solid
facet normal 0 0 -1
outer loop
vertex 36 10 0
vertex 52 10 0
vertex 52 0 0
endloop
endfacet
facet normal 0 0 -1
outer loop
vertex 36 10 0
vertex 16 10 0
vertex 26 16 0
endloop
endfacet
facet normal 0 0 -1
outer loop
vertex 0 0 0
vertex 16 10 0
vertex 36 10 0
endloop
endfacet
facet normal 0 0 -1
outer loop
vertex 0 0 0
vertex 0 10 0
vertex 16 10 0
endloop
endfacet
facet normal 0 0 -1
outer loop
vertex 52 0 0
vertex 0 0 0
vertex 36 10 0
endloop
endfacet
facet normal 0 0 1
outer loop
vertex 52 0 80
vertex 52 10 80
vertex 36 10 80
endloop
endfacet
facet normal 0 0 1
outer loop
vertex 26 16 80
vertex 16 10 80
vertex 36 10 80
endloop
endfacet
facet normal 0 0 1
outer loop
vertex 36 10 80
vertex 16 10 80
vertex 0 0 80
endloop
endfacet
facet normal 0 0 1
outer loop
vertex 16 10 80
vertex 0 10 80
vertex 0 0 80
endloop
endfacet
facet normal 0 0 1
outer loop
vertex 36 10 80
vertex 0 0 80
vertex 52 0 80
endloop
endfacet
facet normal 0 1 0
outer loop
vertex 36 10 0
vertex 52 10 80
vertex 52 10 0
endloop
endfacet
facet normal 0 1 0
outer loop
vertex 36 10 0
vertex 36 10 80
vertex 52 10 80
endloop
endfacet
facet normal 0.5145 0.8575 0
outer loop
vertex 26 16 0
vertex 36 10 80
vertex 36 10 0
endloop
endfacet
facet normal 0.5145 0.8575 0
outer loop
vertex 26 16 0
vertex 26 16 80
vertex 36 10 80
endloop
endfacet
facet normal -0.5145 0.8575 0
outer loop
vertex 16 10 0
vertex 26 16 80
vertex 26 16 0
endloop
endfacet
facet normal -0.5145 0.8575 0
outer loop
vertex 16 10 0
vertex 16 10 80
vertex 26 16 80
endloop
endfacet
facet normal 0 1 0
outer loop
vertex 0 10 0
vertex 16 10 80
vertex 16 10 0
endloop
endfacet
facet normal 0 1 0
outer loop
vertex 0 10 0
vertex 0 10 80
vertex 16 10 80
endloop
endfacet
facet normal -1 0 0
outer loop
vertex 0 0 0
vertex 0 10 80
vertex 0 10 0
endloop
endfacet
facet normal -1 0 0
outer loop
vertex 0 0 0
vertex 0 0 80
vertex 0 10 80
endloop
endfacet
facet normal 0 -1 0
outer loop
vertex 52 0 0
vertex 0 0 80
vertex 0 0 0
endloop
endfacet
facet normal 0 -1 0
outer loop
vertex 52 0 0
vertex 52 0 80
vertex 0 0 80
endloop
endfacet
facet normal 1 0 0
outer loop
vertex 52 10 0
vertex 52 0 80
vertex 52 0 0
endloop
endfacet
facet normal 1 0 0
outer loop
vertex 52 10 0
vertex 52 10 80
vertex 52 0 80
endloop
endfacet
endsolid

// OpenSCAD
$fn = 32;

// ----------------------------------------------------------------------
// V guide rail: vrib, 52 mm wide
// ----------------------------------------------------------------------

// --- parameters (mm) ---
rail_w = 52;              // rail width, X
base_t = 10;              // base plate thickness
v_depth = 6;              // V feature depth / height
v_half_w = 10;            // half width of the V at the base face
plate_t = 80;             // rail length, Z (the extrusion height)
fit_tol = 0.1;            // declared fit tolerance (prompt contract)
free_tol = 0.5;           // declared free tolerance (prompt contract)

profile = [[0, 0], [52, 0], [52, 10], [36, 10], [26, 16], [16, 10], [0, 10]];  // primary outline, 7 points, counter clockwise

// --- the one profile operation ---
linear_extrude(height = plate_t) polygon(points = profile);
